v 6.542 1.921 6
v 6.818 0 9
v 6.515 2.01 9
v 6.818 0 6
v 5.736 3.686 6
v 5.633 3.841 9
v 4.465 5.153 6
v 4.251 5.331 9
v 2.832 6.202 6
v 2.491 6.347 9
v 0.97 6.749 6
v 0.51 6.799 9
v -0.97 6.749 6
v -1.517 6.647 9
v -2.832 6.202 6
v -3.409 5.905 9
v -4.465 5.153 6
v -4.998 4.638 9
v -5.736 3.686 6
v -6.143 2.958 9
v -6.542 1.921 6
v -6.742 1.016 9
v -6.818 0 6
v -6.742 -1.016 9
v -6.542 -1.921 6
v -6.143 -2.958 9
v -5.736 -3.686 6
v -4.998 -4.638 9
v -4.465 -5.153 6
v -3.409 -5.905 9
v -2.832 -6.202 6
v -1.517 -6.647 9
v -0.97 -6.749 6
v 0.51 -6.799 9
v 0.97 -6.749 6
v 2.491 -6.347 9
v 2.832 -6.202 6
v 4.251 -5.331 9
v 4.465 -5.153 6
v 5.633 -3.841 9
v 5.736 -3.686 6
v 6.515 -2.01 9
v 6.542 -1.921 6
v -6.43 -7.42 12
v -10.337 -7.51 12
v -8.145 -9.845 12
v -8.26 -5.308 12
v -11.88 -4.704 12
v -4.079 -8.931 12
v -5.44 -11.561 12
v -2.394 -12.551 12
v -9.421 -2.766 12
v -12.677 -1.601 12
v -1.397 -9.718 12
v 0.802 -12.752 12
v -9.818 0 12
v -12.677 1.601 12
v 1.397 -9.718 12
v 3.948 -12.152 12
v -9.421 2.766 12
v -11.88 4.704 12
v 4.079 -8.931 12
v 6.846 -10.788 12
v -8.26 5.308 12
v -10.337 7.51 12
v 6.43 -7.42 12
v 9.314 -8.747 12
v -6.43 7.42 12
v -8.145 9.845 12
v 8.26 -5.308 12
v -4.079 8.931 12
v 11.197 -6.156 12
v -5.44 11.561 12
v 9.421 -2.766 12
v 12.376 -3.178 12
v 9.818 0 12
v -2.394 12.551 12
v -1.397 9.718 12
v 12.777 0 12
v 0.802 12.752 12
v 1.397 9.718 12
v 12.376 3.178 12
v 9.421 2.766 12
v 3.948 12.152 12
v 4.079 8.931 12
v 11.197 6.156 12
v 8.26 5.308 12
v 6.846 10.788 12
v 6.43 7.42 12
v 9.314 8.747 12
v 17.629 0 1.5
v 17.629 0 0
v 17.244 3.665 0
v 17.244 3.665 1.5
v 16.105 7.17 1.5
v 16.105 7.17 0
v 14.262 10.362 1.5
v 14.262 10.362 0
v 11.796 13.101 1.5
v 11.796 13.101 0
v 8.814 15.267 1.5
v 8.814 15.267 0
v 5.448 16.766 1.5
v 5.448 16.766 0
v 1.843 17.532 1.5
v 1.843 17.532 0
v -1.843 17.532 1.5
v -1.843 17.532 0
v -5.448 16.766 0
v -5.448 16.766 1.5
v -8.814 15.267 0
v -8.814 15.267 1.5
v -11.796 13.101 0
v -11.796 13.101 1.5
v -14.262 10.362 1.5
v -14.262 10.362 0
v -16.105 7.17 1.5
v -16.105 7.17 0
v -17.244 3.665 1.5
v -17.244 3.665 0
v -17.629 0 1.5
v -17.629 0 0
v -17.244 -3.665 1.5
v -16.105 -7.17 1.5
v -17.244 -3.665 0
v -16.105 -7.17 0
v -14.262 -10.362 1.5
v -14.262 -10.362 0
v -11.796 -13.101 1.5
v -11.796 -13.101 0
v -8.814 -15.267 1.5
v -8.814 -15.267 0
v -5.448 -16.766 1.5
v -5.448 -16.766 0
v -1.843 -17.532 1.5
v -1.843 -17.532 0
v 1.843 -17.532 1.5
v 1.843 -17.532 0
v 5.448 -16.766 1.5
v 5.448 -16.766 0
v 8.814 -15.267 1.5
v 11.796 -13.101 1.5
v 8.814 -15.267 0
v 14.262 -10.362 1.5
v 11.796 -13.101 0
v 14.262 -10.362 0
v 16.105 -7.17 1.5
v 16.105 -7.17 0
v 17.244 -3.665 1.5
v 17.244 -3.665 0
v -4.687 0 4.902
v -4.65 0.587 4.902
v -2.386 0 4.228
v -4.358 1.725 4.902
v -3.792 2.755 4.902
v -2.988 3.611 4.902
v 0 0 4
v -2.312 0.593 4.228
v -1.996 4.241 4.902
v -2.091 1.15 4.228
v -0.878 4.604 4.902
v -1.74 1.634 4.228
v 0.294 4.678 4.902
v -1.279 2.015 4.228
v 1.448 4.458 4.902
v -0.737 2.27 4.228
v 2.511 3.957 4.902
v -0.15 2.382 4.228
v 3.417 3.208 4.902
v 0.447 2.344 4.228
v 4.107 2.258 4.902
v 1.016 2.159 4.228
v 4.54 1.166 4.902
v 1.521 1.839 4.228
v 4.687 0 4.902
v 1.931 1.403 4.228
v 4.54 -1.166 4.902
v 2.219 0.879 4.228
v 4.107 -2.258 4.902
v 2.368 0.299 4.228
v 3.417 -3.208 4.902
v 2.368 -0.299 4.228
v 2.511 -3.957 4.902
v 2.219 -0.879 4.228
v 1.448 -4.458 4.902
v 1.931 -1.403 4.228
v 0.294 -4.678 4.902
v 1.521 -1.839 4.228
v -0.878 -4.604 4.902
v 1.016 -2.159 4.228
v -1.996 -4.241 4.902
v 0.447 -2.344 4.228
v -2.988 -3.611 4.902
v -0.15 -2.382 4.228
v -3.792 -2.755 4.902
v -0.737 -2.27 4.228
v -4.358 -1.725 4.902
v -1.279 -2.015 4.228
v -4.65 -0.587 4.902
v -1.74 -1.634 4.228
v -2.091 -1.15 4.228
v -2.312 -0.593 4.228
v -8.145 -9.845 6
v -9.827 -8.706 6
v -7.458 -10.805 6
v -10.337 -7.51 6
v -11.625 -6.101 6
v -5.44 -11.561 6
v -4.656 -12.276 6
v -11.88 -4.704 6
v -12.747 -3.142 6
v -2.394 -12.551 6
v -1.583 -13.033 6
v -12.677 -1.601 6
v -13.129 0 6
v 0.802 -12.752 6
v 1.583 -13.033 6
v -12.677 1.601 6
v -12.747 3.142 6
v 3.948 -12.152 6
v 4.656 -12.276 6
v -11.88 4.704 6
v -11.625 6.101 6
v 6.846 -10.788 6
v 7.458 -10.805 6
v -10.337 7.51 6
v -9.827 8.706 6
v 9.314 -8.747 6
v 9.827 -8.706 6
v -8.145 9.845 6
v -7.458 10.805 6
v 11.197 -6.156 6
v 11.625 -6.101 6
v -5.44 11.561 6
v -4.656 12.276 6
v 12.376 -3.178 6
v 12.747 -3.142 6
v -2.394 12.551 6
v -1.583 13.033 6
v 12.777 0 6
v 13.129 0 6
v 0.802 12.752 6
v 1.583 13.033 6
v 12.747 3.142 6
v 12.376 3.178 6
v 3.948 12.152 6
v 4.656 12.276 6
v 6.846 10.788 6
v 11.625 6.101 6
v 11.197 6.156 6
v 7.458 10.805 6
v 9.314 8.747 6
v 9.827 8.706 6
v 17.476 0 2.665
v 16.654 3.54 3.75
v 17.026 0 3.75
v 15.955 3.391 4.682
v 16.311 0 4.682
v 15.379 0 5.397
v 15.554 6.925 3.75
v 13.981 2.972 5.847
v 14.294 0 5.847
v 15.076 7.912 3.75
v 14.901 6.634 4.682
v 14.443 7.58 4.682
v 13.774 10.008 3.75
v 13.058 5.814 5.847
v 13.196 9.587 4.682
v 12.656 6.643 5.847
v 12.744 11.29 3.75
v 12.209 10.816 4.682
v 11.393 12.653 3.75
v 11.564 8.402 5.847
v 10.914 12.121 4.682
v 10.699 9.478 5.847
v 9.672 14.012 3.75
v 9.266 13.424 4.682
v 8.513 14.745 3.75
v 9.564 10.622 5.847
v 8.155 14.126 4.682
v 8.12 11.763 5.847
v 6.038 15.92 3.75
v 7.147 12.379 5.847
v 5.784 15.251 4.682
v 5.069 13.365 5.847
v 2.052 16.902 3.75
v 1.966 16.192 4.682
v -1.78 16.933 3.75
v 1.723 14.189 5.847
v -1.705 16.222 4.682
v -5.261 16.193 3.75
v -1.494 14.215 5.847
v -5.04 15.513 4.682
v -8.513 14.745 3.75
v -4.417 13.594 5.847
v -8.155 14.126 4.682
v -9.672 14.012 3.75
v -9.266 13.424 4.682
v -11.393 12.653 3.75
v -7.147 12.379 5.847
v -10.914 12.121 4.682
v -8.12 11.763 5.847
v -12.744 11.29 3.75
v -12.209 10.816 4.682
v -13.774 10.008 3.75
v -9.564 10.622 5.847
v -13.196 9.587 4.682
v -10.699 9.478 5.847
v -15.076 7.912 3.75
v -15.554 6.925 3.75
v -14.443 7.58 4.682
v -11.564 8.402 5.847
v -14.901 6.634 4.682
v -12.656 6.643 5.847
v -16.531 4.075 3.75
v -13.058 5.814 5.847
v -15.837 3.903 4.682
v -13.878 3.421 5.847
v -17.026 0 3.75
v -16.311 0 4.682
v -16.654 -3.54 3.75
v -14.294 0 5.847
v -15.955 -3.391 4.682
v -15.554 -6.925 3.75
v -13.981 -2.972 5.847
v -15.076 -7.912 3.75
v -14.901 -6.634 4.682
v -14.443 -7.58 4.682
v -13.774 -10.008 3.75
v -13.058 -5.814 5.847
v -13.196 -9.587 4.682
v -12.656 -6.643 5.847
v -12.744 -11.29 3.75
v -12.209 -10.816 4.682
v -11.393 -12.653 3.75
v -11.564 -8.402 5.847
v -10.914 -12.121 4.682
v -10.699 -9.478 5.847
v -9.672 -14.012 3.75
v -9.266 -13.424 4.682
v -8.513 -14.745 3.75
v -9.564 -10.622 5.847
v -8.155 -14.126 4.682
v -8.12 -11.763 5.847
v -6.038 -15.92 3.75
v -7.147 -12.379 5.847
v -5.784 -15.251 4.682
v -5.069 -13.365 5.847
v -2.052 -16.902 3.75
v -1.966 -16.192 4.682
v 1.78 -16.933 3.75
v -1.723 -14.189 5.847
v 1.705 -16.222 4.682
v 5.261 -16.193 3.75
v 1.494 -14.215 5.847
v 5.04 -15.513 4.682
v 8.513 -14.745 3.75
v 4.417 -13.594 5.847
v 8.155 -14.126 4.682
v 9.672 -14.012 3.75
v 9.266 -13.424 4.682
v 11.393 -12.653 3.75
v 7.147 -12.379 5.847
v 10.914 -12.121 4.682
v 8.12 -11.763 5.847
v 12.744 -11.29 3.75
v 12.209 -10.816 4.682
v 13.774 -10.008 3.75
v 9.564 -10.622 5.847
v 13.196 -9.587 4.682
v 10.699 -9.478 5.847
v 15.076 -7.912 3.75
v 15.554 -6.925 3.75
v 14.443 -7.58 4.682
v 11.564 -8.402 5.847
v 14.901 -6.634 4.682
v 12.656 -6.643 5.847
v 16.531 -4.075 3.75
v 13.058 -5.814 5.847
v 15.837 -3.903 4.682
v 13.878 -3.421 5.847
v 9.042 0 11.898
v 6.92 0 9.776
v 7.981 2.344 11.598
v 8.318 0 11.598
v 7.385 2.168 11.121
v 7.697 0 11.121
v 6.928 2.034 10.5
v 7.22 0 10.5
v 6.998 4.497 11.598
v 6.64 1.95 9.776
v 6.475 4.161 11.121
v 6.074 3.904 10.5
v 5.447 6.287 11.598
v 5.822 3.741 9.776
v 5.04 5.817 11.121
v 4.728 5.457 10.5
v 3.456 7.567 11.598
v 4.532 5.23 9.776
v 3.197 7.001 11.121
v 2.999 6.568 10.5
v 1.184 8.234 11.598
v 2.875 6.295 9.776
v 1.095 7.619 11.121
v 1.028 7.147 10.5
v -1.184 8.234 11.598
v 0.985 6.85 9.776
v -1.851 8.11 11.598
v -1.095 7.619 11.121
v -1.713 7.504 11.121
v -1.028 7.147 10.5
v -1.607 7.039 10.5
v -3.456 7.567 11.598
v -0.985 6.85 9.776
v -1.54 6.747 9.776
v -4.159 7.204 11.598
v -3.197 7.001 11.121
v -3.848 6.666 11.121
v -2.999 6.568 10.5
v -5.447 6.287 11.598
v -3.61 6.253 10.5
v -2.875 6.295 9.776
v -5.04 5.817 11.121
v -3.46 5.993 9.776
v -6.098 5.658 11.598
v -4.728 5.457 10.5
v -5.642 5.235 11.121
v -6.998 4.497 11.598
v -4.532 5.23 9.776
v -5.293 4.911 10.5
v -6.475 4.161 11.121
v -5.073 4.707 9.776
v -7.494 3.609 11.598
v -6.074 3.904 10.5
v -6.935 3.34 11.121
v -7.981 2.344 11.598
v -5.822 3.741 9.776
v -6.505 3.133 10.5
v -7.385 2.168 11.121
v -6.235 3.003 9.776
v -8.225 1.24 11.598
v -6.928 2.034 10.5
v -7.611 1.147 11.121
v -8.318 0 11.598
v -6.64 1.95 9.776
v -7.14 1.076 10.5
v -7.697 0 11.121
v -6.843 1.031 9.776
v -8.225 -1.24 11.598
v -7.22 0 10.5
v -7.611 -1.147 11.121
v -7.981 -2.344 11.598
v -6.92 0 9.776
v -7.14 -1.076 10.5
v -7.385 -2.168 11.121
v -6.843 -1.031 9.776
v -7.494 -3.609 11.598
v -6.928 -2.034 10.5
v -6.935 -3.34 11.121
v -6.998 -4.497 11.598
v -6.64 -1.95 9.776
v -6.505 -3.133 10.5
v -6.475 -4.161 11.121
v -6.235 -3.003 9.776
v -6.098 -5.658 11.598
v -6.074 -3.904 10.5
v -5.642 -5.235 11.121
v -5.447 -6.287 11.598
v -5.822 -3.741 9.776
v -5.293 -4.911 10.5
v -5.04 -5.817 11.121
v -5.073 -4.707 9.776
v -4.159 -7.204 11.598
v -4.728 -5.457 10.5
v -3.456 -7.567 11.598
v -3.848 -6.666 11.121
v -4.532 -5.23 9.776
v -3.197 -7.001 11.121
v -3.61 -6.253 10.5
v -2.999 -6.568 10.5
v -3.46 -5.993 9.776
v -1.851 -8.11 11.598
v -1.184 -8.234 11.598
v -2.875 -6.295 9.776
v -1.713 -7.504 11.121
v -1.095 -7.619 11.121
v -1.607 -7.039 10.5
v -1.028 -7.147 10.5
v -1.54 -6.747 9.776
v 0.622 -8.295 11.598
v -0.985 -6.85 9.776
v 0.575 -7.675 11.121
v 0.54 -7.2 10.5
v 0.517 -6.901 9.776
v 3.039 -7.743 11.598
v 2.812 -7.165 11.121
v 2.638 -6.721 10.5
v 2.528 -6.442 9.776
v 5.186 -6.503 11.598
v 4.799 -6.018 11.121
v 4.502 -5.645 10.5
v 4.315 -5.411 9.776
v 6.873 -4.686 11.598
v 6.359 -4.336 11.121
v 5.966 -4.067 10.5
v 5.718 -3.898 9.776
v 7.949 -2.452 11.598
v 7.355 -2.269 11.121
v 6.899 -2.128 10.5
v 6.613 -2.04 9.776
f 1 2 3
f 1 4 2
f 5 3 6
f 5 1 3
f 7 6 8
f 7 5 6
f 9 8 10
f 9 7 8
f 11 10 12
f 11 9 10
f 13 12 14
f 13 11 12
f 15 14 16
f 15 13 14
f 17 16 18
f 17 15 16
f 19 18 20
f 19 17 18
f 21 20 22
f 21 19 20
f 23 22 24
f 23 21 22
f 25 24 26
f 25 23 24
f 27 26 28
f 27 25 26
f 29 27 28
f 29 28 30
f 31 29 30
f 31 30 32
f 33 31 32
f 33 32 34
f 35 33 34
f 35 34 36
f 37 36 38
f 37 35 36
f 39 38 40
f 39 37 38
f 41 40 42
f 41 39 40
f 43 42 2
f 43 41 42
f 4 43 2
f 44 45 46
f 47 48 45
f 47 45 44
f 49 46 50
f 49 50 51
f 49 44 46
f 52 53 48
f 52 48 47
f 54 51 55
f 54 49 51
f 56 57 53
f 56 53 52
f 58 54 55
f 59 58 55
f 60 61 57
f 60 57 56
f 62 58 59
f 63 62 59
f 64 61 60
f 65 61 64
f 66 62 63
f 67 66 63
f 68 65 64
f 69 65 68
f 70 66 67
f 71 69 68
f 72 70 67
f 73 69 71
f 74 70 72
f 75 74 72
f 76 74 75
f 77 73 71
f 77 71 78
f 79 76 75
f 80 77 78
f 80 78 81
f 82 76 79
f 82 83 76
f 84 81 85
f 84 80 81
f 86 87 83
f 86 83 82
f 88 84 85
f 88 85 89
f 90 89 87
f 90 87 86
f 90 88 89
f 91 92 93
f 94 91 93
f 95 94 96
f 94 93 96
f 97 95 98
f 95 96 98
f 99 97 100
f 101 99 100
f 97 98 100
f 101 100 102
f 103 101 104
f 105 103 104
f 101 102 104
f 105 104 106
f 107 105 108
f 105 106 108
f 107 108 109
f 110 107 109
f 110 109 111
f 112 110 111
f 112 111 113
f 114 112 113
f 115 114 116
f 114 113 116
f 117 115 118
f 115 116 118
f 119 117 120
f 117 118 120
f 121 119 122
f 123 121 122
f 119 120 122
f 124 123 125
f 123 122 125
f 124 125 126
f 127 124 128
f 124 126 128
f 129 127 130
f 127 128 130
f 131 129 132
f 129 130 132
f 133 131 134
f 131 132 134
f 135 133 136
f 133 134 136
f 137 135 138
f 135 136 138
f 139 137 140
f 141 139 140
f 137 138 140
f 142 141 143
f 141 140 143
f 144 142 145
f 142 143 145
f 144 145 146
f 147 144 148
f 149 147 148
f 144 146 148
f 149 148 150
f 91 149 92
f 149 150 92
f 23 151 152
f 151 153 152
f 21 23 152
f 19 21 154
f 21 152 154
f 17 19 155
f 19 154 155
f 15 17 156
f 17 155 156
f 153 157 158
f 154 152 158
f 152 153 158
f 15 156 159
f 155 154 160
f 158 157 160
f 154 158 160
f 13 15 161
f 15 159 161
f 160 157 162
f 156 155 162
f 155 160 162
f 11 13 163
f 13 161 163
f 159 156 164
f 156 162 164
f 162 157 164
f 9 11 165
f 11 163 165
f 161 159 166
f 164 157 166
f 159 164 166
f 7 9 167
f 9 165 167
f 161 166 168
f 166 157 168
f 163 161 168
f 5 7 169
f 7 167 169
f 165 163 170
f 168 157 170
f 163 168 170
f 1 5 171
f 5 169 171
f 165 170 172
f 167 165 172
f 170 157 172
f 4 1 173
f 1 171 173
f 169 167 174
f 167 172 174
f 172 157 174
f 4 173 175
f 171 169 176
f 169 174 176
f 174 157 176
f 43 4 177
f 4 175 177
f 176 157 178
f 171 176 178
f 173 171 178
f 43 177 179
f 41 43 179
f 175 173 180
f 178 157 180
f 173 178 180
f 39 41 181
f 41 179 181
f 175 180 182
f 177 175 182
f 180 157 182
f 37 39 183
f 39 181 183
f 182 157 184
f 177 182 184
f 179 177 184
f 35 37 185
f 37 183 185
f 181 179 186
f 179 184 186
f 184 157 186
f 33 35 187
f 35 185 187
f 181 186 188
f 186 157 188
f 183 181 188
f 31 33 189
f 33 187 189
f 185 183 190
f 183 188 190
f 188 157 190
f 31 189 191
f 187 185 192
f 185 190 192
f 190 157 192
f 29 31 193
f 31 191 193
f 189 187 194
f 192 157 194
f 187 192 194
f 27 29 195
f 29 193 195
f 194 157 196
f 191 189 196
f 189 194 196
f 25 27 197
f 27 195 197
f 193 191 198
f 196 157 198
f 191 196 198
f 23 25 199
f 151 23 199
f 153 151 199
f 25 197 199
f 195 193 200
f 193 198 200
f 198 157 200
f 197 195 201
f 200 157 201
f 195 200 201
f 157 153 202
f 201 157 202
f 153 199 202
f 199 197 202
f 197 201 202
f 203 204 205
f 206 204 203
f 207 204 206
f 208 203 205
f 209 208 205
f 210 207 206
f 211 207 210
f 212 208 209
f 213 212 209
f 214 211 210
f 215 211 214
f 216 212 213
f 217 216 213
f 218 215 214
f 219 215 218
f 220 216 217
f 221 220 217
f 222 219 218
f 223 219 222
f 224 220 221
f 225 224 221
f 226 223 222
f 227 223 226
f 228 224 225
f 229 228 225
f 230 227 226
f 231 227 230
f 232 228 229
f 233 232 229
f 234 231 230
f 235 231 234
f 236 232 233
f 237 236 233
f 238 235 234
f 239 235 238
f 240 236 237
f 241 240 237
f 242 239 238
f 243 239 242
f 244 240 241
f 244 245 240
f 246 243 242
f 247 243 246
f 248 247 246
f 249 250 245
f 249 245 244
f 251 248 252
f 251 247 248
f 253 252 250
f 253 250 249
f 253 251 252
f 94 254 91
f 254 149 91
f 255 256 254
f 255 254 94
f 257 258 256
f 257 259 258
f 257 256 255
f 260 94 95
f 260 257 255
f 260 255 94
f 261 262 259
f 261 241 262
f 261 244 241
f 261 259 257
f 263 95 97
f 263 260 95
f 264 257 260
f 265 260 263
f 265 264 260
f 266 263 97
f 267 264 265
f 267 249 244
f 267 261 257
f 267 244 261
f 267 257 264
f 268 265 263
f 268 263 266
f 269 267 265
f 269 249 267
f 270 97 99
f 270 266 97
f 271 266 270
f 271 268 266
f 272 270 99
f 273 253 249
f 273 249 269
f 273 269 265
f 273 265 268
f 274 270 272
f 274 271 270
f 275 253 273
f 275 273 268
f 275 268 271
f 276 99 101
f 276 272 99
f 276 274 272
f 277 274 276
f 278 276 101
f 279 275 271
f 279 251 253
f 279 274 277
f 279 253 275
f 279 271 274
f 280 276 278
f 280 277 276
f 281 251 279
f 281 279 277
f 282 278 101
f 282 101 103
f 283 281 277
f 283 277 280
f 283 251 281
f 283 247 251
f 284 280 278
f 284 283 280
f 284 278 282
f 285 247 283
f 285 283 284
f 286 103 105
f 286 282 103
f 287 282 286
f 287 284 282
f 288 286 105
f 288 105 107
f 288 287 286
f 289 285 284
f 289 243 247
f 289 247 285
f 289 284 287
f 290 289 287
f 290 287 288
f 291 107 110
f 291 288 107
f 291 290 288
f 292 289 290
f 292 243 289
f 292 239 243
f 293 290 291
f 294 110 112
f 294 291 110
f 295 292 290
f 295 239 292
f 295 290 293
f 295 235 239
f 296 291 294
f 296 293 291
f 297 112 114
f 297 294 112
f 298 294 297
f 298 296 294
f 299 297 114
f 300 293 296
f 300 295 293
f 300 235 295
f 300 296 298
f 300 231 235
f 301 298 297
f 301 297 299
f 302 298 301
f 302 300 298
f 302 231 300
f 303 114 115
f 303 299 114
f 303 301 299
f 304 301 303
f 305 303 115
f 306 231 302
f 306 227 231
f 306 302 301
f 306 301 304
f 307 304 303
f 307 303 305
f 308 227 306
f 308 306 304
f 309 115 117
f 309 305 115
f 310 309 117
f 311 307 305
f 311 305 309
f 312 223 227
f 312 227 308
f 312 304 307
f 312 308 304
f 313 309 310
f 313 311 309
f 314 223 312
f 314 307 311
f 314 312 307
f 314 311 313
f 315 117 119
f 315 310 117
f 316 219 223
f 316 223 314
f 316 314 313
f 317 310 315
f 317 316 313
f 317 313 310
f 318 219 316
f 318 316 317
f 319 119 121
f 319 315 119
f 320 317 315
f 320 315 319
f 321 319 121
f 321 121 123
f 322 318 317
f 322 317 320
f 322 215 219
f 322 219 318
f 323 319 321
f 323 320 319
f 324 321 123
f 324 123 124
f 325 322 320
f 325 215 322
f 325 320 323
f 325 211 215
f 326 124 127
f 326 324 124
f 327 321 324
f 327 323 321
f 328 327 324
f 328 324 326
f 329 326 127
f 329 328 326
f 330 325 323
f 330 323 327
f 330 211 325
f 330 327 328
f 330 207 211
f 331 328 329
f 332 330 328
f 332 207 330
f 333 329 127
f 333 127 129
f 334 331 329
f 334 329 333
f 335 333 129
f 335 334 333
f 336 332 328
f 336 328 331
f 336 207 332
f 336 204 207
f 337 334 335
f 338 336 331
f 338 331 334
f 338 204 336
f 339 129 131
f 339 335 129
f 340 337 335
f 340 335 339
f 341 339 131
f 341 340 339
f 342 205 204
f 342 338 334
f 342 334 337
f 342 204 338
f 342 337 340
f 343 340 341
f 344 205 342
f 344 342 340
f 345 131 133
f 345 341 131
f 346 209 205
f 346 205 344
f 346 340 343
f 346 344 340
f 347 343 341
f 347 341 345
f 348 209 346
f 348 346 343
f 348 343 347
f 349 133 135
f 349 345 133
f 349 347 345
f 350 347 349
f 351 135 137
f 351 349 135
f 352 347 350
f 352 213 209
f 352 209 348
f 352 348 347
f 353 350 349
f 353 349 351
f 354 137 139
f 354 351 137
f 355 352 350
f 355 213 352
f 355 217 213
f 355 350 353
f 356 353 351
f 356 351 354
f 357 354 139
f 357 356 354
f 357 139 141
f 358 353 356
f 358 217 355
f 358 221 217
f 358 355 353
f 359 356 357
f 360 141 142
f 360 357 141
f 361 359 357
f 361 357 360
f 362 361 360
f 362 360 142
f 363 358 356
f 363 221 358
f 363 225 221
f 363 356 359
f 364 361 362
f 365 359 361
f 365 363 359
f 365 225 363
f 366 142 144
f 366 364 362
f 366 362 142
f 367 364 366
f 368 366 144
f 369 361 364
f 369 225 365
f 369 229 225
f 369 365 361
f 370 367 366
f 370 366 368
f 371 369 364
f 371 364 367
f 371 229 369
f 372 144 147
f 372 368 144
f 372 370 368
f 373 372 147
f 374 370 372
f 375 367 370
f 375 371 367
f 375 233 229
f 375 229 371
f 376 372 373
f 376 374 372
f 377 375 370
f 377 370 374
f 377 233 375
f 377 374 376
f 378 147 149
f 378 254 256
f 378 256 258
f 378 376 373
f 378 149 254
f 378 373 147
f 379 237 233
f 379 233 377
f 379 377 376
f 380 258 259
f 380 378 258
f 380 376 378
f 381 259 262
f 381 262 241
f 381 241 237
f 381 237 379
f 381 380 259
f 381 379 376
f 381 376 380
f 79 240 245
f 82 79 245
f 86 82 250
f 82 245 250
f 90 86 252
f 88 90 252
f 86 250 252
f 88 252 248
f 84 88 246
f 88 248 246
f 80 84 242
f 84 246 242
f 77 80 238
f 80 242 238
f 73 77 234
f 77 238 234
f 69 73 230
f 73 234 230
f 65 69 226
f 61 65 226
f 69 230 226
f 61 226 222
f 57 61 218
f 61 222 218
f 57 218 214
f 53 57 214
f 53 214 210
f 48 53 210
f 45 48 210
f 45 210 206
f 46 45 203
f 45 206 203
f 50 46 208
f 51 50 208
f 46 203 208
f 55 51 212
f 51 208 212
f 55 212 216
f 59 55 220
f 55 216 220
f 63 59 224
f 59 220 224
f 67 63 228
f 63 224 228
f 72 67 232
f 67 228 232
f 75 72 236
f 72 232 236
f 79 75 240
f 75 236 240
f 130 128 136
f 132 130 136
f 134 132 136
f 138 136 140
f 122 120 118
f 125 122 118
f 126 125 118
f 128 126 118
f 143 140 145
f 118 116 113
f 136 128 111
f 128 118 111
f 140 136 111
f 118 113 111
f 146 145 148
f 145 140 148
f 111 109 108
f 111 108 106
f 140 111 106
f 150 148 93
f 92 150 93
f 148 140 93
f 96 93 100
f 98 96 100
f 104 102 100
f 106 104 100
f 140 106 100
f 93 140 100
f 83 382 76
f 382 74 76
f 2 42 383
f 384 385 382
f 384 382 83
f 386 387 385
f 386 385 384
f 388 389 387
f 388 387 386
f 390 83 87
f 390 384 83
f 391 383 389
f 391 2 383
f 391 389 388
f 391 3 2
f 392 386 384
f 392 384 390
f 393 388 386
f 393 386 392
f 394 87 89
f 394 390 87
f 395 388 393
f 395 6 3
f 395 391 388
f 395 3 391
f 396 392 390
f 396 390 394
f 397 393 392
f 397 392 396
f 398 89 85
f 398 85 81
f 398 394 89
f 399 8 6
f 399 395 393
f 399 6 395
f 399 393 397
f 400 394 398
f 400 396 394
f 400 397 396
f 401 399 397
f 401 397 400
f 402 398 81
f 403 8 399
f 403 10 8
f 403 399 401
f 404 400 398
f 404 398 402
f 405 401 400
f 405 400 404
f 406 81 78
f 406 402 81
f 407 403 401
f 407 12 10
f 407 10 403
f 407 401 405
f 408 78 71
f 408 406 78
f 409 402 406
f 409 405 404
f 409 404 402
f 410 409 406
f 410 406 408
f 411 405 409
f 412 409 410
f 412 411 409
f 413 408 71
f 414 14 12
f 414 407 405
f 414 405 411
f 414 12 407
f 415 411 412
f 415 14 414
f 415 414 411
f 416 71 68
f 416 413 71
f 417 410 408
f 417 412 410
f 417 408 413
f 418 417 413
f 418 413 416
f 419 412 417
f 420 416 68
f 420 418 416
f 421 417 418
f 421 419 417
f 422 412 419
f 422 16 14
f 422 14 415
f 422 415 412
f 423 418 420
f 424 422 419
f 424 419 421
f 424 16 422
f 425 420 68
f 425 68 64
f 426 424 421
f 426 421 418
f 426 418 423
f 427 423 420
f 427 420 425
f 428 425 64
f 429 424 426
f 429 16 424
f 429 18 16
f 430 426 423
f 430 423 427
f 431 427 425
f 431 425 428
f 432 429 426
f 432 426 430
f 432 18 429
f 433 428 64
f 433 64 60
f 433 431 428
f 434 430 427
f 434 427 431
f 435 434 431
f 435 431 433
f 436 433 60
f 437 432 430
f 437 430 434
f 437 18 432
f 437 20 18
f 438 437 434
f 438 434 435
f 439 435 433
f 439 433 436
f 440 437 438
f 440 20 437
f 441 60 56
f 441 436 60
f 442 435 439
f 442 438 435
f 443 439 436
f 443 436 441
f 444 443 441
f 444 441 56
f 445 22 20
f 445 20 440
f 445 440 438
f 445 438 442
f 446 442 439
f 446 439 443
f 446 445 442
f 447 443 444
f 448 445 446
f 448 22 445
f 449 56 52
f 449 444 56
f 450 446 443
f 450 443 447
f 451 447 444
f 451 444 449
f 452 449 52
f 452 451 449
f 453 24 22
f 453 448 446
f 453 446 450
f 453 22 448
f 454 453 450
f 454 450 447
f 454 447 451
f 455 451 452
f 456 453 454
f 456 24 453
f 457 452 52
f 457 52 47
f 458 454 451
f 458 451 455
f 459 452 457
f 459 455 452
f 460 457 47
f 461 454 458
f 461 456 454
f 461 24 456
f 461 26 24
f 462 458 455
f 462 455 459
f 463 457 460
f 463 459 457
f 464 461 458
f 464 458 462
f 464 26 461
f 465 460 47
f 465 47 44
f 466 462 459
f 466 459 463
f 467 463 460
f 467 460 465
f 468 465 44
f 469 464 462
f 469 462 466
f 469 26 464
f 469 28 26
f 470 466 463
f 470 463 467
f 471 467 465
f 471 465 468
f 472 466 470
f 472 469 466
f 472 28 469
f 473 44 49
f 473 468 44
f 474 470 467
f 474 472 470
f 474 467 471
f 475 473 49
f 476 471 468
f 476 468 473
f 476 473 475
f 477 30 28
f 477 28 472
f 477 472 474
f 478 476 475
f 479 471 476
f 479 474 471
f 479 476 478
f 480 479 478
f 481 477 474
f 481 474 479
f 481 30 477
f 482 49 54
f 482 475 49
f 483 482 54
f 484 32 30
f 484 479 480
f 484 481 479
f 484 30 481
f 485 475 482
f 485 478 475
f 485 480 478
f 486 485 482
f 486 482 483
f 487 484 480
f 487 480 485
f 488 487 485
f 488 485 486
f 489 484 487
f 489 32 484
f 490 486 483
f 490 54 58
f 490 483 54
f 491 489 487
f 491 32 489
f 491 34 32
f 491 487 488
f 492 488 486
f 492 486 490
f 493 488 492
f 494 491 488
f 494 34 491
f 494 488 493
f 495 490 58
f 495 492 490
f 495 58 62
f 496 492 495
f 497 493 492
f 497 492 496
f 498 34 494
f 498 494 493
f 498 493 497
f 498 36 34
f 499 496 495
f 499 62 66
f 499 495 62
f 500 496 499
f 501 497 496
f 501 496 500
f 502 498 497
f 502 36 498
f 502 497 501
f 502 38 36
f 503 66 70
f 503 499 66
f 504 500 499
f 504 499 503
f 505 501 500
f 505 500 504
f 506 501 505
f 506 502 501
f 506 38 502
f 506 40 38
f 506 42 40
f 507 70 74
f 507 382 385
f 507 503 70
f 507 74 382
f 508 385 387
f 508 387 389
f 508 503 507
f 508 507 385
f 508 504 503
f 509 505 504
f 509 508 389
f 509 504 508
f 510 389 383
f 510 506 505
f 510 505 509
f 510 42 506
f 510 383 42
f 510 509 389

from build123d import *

# Parameters (mm, degrees)
SKETCH1_R           = 17.628998489
BOSS_EXTRUDE1_DEPTH = 6
SKETCH2_R           = 12.777406612
SKETCH2_R_2         = 6.818235005
BOSS_EXTRUDE2_DEPTH = 6
FILLET1_R           = 4.5
FILLET2_R           = 3
DOME1_FACE_RADIUS   = 6.818235005
DOME1_HEIGHT        = 2


with BuildPart() as part:
    # Sketch1 → Boss-Extrude1 (new body)
    with BuildSketch(Plane.XY):
        Circle(SKETCH1_R)
    extrude(amount=BOSS_EXTRUDE1_DEPTH)

    # Sketch2 → Boss-Extrude2 (add)
    with BuildSketch(Plane.XY.offset(6)):
        Circle(SKETCH2_R)
        Circle(SKETCH2_R_2, mode=Mode.SUBTRACT)
    extrude(amount=BOSS_EXTRUDE2_DEPTH)

    # Fillet1
    fillet1_edges = [part.edges().sort_by_distance(p)[0] for p in [
        (-17.628998489, 0, 6),
    ]]
    fillet(fillet1_edges, radius=FILLET1_R)

    # Fillet2
    fillet2_edges = [part.edges().sort_by_distance(p)[0] for p in [
        (-6.818235005, 0, 12),
    ]]
    fillet(fillet2_edges, radius=FILLET2_R)

    # Dome1: a dome of height H over a round flat face of radius A is a cap of a sphere of radius (A * A + H * H) / (2 * H)
    dome1_r = (DOME1_FACE_RADIUS * DOME1_FACE_RADIUS + DOME1_HEIGHT * DOME1_HEIGHT) / (2 * DOME1_HEIGHT)
    dome1_base = Plane((0, 0, 6), z_dir=(0, 0, -1))
    with Locations(dome1_base.offset(DOME1_HEIGHT - dome1_r)):
        dome1_ball = Sphere(dome1_r, mode=Mode.PRIVATE)
    add(split(dome1_ball, bisect_by=dome1_base, keep=Keep.TOP, mode=Mode.PRIVATE), mode=Mode.SUBTRACT)


solid = part.part
